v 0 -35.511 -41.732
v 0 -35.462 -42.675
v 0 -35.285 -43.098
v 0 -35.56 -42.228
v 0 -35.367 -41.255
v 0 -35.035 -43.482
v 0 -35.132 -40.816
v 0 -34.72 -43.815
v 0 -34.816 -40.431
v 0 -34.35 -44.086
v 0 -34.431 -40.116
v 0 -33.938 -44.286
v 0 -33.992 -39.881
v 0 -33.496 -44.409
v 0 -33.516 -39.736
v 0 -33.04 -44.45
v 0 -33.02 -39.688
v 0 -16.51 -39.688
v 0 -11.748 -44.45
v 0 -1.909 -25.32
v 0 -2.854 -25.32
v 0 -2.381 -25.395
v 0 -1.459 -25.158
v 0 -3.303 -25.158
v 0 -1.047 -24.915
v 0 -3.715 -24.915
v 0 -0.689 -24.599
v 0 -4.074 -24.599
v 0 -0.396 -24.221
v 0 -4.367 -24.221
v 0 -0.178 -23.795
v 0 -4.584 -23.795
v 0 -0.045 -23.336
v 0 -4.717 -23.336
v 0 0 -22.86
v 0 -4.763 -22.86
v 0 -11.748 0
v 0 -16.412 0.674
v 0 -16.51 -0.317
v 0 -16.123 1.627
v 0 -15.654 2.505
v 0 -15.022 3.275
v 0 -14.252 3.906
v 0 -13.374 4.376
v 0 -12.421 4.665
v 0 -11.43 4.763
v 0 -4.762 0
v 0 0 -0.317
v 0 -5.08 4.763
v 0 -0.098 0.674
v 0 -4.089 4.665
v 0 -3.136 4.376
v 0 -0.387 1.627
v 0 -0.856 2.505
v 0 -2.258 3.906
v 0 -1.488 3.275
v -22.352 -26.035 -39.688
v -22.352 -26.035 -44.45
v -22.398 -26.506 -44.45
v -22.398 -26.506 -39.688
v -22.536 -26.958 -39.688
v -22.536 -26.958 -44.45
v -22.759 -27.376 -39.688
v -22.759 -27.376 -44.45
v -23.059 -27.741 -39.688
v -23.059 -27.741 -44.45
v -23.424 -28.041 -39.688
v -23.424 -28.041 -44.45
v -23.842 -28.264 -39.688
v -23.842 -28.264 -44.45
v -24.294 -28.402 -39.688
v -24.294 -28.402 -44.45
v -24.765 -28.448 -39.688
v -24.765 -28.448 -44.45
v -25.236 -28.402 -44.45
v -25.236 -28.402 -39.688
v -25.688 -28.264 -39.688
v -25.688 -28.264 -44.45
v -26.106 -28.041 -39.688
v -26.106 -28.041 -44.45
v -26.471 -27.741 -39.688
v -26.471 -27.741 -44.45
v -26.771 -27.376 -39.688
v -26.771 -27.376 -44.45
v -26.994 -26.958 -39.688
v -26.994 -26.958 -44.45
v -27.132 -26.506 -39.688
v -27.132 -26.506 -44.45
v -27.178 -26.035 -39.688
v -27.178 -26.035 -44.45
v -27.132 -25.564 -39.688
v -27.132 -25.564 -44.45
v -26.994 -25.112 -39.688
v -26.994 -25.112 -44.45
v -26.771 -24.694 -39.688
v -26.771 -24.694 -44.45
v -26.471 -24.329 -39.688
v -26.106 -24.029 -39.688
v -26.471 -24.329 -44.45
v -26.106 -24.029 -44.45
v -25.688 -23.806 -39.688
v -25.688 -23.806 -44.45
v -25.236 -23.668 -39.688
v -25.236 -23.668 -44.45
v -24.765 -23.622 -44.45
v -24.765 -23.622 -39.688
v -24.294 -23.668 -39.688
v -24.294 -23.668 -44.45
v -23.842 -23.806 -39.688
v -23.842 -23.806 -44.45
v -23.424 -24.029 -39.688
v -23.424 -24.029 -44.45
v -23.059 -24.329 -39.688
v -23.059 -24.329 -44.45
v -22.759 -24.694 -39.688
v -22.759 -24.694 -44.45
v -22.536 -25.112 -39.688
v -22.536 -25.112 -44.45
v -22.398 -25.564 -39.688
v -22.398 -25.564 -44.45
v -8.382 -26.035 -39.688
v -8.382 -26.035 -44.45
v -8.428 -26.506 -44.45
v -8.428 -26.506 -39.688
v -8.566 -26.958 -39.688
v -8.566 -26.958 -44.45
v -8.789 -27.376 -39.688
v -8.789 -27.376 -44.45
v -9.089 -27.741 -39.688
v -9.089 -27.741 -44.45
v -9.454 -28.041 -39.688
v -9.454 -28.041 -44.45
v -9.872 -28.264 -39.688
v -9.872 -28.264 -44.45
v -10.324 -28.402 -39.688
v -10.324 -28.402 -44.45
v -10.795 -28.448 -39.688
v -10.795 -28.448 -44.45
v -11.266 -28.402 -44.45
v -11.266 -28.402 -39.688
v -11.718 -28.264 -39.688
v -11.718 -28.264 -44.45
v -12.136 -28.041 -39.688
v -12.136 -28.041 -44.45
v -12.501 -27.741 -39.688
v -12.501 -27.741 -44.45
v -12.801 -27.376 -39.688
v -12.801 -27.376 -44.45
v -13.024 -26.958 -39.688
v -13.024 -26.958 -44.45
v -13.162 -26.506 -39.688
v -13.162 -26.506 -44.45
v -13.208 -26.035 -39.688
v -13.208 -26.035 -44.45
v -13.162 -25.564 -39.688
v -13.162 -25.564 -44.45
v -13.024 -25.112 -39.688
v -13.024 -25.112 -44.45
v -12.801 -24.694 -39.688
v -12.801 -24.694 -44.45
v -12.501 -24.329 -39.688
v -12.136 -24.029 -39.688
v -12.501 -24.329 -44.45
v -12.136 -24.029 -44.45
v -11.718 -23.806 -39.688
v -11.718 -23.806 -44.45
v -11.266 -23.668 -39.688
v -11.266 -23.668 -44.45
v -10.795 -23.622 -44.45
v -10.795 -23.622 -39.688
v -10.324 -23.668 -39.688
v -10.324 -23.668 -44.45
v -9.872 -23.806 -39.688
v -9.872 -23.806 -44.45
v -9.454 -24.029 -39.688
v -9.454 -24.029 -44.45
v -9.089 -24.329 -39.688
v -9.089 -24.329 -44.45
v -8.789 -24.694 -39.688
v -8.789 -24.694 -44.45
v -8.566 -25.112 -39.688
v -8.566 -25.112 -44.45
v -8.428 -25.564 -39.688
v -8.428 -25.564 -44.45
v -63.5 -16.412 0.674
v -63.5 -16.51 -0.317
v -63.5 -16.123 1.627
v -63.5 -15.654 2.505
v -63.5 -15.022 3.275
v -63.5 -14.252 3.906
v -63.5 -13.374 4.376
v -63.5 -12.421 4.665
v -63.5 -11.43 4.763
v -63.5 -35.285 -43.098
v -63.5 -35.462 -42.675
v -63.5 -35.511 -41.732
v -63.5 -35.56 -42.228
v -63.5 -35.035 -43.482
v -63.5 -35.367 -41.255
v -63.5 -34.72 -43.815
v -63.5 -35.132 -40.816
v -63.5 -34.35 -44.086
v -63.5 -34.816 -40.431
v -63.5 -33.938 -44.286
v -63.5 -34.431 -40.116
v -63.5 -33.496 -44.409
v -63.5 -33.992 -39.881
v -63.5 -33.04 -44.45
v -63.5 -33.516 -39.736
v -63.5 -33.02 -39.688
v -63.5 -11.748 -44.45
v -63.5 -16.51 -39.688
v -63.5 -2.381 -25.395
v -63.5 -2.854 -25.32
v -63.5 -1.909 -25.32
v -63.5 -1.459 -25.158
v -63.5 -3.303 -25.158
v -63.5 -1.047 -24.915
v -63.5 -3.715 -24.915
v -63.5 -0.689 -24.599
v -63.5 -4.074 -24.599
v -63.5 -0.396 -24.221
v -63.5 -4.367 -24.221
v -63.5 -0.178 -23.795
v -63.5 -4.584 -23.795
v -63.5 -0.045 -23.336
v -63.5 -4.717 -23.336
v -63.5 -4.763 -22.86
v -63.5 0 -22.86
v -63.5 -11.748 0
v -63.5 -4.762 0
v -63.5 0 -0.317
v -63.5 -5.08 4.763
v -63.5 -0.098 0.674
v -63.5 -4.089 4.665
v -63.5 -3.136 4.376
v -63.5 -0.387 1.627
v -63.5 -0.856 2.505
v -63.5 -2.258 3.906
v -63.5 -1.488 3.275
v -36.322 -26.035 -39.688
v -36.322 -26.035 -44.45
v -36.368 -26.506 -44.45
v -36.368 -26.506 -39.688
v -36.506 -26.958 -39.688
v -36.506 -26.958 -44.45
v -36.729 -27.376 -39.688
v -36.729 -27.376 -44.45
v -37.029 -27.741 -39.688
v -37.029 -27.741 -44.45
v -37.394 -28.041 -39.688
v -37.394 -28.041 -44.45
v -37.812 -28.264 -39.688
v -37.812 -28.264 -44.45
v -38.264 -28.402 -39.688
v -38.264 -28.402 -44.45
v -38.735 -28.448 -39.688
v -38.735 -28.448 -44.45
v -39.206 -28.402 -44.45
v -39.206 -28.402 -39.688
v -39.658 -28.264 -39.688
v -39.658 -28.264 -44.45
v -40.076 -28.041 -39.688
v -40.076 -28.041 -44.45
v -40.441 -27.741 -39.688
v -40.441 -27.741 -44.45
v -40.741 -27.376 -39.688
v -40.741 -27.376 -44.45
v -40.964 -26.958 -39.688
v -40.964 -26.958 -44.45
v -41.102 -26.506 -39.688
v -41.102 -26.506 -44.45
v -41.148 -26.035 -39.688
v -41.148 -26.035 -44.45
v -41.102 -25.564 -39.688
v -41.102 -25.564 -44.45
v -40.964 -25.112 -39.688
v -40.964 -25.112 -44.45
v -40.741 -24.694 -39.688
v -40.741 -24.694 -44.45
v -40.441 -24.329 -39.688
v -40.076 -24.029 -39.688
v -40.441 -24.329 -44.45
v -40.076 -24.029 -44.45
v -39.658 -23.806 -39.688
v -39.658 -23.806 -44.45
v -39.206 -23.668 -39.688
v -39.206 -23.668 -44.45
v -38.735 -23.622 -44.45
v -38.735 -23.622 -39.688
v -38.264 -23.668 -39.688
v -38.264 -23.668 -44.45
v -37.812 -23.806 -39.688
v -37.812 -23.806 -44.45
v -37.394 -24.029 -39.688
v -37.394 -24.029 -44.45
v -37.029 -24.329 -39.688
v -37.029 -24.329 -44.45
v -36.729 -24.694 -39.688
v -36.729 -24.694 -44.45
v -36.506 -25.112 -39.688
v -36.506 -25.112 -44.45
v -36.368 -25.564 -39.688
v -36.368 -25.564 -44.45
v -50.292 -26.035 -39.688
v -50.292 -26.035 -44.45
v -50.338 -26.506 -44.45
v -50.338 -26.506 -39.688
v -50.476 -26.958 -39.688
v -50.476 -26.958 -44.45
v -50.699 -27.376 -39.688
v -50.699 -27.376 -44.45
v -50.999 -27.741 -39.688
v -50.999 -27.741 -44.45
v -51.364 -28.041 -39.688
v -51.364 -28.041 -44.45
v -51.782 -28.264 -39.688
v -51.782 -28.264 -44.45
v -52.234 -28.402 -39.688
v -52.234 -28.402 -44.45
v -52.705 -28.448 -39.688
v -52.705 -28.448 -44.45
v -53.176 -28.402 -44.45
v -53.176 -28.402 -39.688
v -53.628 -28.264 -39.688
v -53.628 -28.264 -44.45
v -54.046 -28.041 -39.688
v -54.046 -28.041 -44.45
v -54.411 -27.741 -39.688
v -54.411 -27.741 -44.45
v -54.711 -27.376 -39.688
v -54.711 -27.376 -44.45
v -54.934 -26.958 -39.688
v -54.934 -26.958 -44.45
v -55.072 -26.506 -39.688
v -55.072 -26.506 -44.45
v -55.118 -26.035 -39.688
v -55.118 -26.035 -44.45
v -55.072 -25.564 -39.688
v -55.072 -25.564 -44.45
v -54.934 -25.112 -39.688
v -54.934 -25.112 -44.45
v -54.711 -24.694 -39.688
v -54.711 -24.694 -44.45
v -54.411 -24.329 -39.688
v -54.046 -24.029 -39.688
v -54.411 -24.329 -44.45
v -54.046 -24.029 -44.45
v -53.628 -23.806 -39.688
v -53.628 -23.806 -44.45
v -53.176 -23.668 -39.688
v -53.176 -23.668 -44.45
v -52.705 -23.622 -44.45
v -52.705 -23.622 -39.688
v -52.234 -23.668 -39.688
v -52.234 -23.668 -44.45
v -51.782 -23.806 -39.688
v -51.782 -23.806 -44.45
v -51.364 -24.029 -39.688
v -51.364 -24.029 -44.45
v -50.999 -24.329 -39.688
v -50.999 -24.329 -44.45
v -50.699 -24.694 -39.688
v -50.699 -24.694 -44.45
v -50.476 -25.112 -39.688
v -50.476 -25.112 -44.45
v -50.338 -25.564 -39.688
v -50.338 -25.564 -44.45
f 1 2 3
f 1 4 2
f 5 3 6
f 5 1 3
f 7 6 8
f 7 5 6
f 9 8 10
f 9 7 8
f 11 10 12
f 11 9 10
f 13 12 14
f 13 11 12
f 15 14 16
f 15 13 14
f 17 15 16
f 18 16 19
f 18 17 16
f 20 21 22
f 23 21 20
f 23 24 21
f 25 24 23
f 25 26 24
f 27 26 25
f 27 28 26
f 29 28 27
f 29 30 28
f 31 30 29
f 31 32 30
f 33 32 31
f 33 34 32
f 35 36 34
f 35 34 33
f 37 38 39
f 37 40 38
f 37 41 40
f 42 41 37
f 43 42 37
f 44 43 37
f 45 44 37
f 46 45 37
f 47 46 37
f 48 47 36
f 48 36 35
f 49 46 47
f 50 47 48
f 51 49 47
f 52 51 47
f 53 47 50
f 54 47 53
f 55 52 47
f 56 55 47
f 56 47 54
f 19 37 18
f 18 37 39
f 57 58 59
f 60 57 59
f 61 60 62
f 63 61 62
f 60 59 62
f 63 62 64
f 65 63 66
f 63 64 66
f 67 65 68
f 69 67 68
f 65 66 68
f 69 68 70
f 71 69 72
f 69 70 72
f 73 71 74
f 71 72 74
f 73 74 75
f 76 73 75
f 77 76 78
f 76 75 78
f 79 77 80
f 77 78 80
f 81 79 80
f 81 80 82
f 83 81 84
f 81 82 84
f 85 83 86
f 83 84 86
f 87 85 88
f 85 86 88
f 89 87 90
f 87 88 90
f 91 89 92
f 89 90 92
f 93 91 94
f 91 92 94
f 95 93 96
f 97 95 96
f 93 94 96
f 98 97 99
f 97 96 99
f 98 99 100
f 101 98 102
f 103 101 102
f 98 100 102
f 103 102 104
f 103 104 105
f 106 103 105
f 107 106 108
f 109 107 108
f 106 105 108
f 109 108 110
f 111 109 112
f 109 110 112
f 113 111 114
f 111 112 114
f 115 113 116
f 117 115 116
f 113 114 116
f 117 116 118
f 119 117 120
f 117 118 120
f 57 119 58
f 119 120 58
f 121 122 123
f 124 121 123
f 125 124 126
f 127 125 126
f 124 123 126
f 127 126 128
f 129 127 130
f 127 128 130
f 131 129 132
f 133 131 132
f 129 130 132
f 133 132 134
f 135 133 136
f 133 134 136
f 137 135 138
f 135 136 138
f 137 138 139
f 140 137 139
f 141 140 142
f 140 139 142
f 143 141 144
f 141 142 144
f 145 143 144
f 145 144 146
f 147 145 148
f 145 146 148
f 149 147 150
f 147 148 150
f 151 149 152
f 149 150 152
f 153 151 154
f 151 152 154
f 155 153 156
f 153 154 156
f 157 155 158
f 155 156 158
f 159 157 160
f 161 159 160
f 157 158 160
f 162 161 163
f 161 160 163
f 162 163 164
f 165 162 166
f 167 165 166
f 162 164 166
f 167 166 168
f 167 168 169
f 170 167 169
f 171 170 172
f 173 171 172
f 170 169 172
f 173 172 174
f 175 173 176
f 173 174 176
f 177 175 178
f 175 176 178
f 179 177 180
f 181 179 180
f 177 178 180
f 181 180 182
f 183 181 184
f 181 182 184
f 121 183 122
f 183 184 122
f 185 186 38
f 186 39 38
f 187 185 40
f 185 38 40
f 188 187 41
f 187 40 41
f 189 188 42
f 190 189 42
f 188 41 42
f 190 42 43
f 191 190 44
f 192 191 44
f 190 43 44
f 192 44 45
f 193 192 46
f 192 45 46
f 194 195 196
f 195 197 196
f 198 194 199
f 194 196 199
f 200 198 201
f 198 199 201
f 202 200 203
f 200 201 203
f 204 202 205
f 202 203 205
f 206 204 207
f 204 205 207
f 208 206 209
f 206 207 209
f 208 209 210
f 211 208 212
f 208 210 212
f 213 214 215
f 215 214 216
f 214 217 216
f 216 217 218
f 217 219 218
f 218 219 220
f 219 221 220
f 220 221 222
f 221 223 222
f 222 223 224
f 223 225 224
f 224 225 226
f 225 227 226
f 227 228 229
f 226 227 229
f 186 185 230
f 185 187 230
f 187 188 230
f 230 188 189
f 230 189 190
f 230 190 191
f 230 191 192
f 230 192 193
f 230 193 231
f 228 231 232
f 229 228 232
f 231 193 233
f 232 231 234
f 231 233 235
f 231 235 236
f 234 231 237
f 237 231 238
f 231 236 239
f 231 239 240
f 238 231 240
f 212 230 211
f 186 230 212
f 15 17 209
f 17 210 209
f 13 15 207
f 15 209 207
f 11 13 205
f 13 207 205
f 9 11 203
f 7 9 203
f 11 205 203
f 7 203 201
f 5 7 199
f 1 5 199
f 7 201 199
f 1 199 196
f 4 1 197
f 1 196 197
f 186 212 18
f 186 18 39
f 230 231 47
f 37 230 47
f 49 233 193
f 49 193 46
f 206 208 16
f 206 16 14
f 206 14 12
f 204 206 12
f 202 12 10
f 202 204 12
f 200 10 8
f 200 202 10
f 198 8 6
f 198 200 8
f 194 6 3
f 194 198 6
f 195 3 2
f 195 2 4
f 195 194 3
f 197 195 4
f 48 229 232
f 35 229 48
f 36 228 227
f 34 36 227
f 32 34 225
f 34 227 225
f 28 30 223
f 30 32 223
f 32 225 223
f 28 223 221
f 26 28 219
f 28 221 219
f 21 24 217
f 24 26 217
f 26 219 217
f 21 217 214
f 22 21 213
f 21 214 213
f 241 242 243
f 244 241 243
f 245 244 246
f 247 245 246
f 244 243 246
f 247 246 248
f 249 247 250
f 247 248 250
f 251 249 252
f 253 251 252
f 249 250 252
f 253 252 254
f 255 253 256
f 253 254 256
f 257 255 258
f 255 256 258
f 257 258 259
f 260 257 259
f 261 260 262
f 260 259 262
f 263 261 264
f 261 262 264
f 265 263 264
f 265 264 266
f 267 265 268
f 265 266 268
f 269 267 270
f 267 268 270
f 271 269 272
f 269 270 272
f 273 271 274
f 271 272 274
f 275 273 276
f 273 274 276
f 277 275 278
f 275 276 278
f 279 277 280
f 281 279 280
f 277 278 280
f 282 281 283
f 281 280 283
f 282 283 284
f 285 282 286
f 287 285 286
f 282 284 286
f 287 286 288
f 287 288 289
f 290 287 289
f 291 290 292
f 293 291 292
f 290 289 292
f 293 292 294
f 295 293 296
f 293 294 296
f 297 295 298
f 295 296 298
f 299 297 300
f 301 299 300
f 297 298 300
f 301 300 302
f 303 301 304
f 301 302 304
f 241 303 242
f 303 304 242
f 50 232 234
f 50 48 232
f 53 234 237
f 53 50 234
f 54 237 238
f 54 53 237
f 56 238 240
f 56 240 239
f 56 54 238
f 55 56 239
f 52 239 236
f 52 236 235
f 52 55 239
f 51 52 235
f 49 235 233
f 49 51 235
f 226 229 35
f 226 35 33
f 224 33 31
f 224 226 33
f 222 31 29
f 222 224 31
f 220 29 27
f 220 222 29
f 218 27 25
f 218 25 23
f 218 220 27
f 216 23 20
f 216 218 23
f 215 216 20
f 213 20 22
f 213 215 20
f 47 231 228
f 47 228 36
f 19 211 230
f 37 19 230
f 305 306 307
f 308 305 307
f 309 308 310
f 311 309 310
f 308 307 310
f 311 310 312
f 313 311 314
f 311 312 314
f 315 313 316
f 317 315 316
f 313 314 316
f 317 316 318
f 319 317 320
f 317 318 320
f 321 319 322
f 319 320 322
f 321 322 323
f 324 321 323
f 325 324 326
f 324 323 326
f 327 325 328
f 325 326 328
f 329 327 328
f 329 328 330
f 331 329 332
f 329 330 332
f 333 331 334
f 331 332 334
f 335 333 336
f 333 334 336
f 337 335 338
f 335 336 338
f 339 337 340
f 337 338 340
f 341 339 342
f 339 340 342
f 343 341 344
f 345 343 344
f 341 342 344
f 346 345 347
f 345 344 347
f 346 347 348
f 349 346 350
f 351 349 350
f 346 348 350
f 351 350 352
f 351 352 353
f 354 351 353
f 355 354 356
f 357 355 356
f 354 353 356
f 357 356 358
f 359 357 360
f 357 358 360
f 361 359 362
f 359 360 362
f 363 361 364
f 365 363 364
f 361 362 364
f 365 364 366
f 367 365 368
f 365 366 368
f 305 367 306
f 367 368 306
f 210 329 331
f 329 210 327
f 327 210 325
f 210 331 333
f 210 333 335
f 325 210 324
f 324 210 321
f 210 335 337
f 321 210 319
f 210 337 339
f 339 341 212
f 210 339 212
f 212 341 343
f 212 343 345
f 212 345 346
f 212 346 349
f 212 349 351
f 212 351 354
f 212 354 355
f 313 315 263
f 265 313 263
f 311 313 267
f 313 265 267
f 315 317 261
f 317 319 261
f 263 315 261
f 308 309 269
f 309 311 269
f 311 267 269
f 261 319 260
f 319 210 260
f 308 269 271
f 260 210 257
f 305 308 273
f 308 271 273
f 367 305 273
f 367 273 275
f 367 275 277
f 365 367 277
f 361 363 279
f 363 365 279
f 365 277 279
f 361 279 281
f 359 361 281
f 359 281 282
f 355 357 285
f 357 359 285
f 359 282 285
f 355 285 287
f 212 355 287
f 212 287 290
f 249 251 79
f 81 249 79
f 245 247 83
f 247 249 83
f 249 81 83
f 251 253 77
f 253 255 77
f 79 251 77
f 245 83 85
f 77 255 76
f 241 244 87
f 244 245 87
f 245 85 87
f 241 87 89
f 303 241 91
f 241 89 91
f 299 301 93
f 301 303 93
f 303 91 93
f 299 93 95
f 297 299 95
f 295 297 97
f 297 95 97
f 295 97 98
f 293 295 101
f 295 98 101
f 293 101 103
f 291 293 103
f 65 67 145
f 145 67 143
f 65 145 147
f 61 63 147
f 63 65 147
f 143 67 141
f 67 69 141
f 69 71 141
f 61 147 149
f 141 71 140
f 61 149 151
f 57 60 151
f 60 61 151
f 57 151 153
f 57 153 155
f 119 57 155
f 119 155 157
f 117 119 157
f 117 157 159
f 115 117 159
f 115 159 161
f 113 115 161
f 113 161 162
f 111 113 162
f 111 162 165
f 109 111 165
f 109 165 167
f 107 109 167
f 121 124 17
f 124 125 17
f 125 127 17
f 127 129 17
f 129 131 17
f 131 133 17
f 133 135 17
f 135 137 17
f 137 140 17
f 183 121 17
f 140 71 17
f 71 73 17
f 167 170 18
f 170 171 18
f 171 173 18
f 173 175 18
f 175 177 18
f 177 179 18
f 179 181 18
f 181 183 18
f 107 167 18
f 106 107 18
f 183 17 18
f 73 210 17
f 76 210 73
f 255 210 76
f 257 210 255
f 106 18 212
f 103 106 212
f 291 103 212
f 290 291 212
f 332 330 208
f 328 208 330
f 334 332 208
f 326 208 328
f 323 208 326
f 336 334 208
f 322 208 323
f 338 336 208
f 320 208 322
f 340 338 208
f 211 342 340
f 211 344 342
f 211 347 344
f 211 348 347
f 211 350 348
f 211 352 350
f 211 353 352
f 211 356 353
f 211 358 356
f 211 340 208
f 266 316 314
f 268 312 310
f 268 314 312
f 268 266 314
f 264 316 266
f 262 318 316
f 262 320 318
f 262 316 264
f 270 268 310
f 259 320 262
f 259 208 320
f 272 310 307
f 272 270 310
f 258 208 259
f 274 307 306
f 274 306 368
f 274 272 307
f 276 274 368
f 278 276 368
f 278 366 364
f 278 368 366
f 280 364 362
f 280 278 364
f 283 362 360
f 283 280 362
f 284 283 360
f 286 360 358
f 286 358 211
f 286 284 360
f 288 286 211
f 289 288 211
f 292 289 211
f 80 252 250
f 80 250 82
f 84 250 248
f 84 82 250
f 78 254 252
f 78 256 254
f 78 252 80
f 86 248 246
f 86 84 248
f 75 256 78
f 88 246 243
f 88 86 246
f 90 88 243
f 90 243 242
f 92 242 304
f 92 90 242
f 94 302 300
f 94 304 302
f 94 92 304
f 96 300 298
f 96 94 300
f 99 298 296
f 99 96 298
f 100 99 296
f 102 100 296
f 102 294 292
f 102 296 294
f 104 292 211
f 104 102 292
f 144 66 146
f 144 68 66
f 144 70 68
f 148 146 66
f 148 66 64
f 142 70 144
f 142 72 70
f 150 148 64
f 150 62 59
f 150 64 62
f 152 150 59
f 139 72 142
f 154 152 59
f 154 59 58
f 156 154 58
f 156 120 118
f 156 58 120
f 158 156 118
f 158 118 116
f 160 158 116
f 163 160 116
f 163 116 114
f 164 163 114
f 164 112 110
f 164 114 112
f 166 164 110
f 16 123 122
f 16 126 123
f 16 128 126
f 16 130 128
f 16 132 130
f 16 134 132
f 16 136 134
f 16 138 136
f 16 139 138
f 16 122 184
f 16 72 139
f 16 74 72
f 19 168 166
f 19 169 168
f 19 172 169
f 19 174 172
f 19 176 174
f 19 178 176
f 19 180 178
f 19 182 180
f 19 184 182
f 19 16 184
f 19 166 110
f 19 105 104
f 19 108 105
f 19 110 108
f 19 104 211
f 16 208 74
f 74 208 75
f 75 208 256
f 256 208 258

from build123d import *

# Parameters (mm, degrees)
F0_W         = 63.5
F0_H         = 25.4
F1_DEPTH     = 4.7625
F2_W         = 63.5
F2_H         = 16.51
F3_DEPTH     = 4.7625
F4_W         = 4.7625
F4_H         = 44.45
F5_DEPTH     = 63.5
F6_W         = 19.05
F6_H         = 4.7625
F7_DEPTH     = 63.5
F8_R         = 2.413
F9_DEPTH     = 4.7625
F10_R        = 5.08
F11_R        = 2.54
F12_T1_DEPTH = 76.2
F13_T1_DEPTH = 76.1003906189


# Not quite as in the source:
# - a fillet or chamfer that OpenCascade refuses, or shapes differently, is made with other operations: its cross-section is extruded or revolved along the edge and cut away or added


with BuildPart() as f1:
    # F0 (on Front) → F1 (new body)
    with BuildSketch(Plane.XZ):
        with Locations((-31.75, -12.7)):
            Rectangle(F0_W, F0_H)
    extrude(amount=F1_DEPTH)

    # F2 (on Top) → F3 (join)
    with BuildSketch(Plane.XY):
        with Locations((-31.75, -8.255)):
            Rectangle(F2_W, F2_H)
    extrude(amount=F3_DEPTH)

    # F4 (on Right) → F5 (join)
    with BuildSketch(Plane.YZ):
        with Locations((-14.12875, -22.225)):
            Rectangle(F4_W, F4_H)
    extrude(amount=-F5_DEPTH)

    # F6 (on Right) → F7 (join)
    with BuildSketch(Plane.YZ):
        with Locations((-26.035, -42.06875)):
            Rectangle(F6_W, F6_H)
    extrude(amount=-F7_DEPTH)

    # F8 (on face) → F9 (cut)
    with BuildSketch(Plane(origin=(0, 0, -44.45), x_dir=(1, 0, 0), z_dir=(0, 0, -1))):
        with Locations((-52.705, 26.035)):
            Circle(F8_R)
        with Locations((-38.735, 26.035)):
            Circle(F8_R)
        with Locations((-24.765, 26.035)):
            Circle(F8_R)
        with Locations((-10.795, 26.035)):
            Circle(F8_R)
    extrude(amount=-F9_DEPTH, mode=Mode.SUBTRACT)

    # F10
    f10_edges = [f1.edges().sort_by_distance(p)[0] for p in [
        (-31.75, 0, 4.7625),
        (-31.75, -16.51, 4.7625),
    ]]
    fillet(f10_edges, radius=F10_R)

    # F11
    f11_edges = [f1.edges().sort_by_distance(p)[0] for p in [
        (-31.75, -35.56, -39.6875),
    ]]
    fillet(f11_edges, radius=F11_R)

    # F12: fillet of radius 2.54 on 2 edges, made by hand

    # F12_s2 → F12_t1 (cut)
    with BuildSketch(Plane.YZ.offset(-69.85)):
        with BuildLine():
            ThreePointArc((-4.7625, -22.86), (-4.0185512242, -24.6560512242), (-2.2225, -25.4))
            Line((-2.2225, -25.4), (-4.7625, -25.4))
            Line((-4.7625, -25.4), (-4.7625, -22.86))
        make_face()
        with BuildLine():
            ThreePointArc((0, -22.86), (-0.7439487758, -24.6560512242), (-2.54, -25.4))
            Line((-2.54, -25.4), (0, -25.4))
            Line((0, -25.4), (0, -22.86))
        make_face()
    extrude(amount=F12_T1_DEPTH, mode=Mode.SUBTRACT)

    # F13: fillet of radius 2.54 on 1 edges, made by hand

    # F13_s2 → F13_t1 (cut)
    with BuildSketch(Plane.YZ.offset(-69.8001953095)):
        with BuildLine():
            ThreePointArc((-33.0399218762, -44.45), (-34.7199739587, -43.815), (-35.56, -42.2275))
            Line((-35.56, -42.2275), (-35.56, -44.45))
            Line((-35.56, -44.45), (-33.0399218762, -44.45))
        make_face()
    extrude(amount=F13_T1_DEPTH, mode=Mode.SUBTRACT)


solid = f1.part
